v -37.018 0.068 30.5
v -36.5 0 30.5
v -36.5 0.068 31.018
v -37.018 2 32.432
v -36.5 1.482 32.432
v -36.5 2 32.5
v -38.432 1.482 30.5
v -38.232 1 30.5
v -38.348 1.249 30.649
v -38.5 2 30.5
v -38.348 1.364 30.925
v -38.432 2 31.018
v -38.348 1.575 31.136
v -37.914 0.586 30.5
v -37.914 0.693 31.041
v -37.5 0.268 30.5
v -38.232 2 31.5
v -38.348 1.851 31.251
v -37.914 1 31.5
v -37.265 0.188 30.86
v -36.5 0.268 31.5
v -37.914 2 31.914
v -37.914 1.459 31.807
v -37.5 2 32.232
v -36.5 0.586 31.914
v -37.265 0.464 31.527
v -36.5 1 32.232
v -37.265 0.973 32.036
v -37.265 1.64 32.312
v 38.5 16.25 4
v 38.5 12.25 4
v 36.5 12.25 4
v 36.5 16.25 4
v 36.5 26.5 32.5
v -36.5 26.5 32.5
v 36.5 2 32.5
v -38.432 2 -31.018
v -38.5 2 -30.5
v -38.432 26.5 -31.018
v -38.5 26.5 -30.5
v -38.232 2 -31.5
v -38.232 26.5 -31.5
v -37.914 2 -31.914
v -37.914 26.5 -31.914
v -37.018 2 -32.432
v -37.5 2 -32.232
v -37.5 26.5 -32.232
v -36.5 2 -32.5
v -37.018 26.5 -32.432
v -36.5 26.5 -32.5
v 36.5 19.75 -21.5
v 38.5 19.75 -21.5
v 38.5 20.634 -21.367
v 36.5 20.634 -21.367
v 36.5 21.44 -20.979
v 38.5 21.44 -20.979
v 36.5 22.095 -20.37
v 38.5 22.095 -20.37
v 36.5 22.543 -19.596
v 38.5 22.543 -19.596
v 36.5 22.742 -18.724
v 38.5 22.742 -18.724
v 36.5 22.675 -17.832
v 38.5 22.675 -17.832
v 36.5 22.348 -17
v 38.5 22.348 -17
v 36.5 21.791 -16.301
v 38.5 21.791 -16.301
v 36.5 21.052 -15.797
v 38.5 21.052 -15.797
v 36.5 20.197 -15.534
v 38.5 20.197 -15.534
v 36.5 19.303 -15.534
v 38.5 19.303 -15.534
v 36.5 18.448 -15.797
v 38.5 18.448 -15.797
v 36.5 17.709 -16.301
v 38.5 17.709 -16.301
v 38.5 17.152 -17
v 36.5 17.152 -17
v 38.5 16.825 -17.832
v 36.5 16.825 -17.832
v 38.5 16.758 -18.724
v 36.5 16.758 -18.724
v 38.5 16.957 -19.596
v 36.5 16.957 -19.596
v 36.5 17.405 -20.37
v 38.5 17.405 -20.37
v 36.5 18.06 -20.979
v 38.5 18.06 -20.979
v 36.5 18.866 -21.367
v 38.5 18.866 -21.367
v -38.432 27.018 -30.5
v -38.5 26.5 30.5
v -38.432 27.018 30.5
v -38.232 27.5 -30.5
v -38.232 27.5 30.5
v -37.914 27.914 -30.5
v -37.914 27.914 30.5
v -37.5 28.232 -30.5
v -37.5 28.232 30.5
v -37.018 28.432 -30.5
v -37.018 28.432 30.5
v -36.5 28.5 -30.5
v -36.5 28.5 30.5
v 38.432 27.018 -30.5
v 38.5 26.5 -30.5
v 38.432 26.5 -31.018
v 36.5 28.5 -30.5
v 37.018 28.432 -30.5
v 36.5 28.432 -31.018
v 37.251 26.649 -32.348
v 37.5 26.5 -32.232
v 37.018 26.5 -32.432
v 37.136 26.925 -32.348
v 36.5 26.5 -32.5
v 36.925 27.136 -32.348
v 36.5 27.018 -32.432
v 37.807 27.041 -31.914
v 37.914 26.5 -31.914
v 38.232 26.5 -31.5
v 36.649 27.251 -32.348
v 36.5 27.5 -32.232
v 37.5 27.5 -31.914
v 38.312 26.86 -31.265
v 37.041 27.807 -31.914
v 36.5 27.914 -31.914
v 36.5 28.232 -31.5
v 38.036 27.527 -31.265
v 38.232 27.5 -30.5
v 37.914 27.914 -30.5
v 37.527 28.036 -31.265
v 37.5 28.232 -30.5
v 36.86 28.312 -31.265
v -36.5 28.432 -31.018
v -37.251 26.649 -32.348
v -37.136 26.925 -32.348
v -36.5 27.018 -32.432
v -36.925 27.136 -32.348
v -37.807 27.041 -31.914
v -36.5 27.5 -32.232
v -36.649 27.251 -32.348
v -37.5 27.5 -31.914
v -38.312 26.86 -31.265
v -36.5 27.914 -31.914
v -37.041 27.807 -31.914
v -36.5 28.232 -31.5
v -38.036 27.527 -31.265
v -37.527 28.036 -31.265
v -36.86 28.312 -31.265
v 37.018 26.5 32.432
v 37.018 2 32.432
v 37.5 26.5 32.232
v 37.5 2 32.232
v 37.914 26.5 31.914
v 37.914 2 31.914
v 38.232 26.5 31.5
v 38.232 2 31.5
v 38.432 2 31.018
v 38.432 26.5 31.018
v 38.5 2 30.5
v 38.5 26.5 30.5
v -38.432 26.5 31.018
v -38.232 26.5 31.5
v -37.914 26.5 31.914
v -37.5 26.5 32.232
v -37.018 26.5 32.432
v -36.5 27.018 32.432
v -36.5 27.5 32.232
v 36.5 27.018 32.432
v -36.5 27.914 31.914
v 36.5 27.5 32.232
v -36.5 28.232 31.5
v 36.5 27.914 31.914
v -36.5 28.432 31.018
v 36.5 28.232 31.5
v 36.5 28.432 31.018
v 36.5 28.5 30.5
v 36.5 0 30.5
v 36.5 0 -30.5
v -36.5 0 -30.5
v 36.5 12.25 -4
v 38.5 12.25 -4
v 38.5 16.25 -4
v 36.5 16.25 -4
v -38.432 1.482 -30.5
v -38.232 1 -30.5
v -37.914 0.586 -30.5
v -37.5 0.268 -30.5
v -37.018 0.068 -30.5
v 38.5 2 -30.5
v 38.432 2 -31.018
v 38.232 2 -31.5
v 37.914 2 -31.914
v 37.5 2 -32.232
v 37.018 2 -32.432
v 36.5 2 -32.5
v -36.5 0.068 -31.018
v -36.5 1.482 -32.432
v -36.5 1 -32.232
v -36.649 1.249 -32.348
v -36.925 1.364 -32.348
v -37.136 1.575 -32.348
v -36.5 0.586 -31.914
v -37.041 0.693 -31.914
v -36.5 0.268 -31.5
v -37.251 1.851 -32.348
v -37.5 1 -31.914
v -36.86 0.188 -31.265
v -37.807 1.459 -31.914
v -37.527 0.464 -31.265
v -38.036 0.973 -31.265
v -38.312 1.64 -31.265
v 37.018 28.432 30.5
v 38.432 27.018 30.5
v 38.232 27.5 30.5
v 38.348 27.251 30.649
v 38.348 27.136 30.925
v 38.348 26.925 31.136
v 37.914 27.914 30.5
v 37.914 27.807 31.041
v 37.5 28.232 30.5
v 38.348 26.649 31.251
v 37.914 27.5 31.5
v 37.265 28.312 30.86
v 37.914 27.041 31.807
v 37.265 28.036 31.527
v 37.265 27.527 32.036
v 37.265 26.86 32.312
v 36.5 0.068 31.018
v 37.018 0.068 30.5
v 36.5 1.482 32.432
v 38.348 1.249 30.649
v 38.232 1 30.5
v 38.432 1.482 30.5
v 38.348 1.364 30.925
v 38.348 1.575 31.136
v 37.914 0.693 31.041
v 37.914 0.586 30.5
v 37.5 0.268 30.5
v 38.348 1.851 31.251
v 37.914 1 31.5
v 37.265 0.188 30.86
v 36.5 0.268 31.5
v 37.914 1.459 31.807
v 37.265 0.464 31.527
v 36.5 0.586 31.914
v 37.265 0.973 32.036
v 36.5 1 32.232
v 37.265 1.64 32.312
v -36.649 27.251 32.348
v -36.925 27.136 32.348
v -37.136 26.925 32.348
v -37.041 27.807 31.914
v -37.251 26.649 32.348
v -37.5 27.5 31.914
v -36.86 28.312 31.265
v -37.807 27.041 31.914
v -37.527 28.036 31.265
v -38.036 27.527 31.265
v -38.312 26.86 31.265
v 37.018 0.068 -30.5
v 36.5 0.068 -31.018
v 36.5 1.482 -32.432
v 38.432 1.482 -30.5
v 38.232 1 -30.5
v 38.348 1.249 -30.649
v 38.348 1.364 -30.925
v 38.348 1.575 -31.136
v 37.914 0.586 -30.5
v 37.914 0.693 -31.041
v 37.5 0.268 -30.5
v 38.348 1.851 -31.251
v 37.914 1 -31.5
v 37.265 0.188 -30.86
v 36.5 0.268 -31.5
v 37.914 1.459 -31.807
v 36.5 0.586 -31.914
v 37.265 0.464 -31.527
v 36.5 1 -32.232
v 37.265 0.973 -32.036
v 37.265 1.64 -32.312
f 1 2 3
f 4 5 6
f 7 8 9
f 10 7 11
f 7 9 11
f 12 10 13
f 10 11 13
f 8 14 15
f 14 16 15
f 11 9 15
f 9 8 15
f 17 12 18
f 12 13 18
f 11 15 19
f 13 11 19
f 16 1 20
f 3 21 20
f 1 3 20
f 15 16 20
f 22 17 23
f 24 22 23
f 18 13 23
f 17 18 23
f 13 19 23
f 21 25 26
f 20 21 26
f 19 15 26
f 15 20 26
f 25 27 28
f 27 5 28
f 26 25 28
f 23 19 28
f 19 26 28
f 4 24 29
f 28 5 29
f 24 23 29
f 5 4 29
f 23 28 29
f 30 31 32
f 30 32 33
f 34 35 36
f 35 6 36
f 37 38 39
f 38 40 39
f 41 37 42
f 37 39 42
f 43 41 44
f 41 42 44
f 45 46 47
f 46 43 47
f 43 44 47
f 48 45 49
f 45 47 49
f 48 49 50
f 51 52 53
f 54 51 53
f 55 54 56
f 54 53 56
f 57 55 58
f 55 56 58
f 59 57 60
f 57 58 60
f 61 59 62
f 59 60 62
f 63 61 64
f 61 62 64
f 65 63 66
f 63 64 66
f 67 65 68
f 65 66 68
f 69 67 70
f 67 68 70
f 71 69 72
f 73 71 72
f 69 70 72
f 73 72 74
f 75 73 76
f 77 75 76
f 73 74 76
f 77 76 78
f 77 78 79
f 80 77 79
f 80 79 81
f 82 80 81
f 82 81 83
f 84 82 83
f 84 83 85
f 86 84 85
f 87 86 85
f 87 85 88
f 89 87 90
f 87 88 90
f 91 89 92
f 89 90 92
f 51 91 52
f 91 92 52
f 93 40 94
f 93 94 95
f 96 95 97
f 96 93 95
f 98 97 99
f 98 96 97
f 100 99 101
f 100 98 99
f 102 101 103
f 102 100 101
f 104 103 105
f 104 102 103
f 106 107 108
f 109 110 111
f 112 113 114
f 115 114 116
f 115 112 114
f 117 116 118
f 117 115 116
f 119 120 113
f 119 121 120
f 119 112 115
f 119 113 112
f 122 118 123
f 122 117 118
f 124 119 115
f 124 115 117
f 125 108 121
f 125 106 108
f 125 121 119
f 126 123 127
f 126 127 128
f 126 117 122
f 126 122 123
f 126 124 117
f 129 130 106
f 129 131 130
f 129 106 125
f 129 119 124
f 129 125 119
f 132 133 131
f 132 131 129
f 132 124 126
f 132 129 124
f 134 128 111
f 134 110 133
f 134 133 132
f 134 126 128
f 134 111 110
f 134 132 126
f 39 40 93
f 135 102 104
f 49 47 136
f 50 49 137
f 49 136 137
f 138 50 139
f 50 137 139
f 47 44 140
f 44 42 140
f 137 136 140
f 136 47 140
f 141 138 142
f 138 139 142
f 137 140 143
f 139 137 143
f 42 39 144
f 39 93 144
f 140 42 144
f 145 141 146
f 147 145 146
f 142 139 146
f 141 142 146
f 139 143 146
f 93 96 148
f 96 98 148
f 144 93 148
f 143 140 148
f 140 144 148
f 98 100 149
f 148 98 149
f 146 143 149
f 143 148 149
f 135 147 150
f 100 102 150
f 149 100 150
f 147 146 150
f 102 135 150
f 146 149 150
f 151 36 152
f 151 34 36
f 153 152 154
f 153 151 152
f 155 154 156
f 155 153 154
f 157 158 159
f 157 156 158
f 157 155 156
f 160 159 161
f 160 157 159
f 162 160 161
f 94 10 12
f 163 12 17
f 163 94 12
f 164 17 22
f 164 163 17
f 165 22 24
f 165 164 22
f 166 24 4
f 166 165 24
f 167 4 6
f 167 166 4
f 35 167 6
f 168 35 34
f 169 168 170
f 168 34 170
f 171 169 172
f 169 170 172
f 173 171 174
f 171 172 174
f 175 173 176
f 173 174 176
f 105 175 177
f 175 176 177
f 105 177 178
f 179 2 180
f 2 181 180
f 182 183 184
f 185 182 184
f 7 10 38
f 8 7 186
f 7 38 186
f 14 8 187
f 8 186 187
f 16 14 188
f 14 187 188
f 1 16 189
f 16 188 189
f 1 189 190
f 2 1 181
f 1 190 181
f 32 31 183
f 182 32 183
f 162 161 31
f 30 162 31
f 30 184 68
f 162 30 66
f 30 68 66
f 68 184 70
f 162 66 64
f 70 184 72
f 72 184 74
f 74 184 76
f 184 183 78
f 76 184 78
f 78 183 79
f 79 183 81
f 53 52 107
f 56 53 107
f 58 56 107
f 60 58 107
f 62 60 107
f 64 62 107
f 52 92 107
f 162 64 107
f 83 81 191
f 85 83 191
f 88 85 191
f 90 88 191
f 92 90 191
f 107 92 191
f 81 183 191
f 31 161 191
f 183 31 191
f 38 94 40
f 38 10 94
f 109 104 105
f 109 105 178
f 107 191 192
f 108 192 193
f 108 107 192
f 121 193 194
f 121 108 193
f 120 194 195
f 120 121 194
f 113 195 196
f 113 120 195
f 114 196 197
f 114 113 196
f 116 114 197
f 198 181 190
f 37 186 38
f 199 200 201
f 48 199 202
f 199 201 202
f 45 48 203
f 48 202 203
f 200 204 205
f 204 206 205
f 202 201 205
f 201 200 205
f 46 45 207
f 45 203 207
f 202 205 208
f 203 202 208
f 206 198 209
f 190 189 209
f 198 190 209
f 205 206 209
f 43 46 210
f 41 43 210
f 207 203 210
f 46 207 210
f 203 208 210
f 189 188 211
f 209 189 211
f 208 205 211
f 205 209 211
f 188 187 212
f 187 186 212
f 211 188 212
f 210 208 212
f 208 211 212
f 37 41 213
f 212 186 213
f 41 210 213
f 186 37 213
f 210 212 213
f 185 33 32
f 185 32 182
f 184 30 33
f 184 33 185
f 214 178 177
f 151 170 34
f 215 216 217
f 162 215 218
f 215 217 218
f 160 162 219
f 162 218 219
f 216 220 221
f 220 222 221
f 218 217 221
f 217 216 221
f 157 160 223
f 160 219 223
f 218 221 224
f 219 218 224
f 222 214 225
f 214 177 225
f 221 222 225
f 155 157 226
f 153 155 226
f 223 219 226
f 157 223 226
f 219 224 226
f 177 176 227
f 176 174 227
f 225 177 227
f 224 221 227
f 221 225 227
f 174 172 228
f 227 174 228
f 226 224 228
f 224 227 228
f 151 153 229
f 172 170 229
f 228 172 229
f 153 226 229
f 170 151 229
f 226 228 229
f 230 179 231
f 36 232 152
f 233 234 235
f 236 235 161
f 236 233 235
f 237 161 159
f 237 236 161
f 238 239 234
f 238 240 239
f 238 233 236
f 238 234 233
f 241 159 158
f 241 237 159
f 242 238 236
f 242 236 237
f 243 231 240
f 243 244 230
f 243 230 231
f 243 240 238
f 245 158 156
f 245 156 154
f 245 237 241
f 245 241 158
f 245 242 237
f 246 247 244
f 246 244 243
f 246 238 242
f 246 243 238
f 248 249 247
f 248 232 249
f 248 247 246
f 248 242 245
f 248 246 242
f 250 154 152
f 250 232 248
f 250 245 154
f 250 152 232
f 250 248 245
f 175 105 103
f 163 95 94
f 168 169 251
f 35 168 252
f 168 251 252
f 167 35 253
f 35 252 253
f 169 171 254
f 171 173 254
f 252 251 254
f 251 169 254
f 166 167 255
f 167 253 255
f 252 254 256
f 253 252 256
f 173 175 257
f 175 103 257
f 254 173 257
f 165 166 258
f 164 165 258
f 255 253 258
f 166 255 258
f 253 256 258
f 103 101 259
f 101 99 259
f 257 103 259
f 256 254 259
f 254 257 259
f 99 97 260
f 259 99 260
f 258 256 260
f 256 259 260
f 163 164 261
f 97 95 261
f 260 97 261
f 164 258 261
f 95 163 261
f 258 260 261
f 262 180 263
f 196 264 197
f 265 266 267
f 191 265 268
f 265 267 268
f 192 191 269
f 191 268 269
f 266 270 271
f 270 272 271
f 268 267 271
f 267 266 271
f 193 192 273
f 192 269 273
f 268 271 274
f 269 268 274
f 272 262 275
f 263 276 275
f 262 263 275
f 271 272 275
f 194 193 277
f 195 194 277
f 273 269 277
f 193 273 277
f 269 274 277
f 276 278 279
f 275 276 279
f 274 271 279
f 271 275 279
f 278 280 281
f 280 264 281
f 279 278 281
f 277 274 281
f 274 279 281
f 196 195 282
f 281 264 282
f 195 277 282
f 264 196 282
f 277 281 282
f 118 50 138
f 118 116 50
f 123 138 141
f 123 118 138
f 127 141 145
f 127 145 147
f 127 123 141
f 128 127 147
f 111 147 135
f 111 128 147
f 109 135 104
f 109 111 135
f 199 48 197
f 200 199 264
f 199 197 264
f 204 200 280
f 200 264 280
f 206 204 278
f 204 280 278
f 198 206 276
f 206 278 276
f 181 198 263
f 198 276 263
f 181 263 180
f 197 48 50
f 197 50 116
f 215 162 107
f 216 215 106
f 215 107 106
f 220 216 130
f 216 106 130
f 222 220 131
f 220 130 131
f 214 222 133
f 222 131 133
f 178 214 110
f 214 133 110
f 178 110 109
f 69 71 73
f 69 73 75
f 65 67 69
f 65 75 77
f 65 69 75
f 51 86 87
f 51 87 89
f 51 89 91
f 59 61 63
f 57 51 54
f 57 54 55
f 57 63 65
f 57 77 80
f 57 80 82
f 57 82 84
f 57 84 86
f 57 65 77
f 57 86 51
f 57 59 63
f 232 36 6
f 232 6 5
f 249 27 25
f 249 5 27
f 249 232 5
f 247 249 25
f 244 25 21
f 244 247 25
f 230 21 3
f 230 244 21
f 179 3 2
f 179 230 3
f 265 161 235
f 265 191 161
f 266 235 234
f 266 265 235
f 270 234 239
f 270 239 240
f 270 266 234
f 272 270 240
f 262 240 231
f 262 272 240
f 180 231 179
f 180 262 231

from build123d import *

# Parameters (mm, degrees)
ESQUISSE1_W             = 77
ESQUISSE1_H             = 65
BOSS_EXTRU_1_DEPTH      = 28.5
CONG_2_R                = 2
ESQUISSE2_R             = 3
ESQUISSE2_W             = 8
ESQUISSE2_H             = 4
ENL_V_MAT_EXTRU_1_DEPTH = 2


with BuildPart() as part:
    # Esquisse1 → Boss.-Extru.1 (new body)
    with BuildSketch(Plane(origin=(0, 0, 0), x_dir=(1, 0, 0), z_dir=(0, 1, 0))):
        Rectangle(ESQUISSE1_W, ESQUISSE1_H)
    extrude(amount=BOSS_EXTRU_1_DEPTH)

    # Congé2
    cong_2_edges = [part.edges().sort_by_distance(p)[0] for p in [
        (-38.5, 28.5, 0),
        (0, 28.5, 32.5),
        (38.5, 28.5, 0),
        (0, 0, 32.5),
        (-38.5, 0, 0),
        (0, 0, -32.5),
        (38.5, 0, 0),
        (38.5, 14.25, 32.5),
        (-38.5, 14.25, 32.5),
        (-38.5, 14.25, -32.5),
        (38.5, 14.25, -32.5),
        (0, 28.5, -32.5),
    ]]
    fillet(cong_2_edges, radius=CONG_2_R)

    # Esquisse2 → Enlèv. mat.-Extru.1 (cut)
    with BuildSketch(Plane(origin=(38.5, 0, 0), x_dir=(0, 0, -1), z_dir=(1, 0, 0))):
        with Locations((18.5, 19.75)):
            Circle(ESQUISSE2_R)
        with Locations((0, 14.25)):
            Rectangle(ESQUISSE2_W, ESQUISSE2_H)
    extrude(amount=-ENL_V_MAT_EXTRU_1_DEPTH, mode=Mode.SUBTRACT)


solid = part.part
